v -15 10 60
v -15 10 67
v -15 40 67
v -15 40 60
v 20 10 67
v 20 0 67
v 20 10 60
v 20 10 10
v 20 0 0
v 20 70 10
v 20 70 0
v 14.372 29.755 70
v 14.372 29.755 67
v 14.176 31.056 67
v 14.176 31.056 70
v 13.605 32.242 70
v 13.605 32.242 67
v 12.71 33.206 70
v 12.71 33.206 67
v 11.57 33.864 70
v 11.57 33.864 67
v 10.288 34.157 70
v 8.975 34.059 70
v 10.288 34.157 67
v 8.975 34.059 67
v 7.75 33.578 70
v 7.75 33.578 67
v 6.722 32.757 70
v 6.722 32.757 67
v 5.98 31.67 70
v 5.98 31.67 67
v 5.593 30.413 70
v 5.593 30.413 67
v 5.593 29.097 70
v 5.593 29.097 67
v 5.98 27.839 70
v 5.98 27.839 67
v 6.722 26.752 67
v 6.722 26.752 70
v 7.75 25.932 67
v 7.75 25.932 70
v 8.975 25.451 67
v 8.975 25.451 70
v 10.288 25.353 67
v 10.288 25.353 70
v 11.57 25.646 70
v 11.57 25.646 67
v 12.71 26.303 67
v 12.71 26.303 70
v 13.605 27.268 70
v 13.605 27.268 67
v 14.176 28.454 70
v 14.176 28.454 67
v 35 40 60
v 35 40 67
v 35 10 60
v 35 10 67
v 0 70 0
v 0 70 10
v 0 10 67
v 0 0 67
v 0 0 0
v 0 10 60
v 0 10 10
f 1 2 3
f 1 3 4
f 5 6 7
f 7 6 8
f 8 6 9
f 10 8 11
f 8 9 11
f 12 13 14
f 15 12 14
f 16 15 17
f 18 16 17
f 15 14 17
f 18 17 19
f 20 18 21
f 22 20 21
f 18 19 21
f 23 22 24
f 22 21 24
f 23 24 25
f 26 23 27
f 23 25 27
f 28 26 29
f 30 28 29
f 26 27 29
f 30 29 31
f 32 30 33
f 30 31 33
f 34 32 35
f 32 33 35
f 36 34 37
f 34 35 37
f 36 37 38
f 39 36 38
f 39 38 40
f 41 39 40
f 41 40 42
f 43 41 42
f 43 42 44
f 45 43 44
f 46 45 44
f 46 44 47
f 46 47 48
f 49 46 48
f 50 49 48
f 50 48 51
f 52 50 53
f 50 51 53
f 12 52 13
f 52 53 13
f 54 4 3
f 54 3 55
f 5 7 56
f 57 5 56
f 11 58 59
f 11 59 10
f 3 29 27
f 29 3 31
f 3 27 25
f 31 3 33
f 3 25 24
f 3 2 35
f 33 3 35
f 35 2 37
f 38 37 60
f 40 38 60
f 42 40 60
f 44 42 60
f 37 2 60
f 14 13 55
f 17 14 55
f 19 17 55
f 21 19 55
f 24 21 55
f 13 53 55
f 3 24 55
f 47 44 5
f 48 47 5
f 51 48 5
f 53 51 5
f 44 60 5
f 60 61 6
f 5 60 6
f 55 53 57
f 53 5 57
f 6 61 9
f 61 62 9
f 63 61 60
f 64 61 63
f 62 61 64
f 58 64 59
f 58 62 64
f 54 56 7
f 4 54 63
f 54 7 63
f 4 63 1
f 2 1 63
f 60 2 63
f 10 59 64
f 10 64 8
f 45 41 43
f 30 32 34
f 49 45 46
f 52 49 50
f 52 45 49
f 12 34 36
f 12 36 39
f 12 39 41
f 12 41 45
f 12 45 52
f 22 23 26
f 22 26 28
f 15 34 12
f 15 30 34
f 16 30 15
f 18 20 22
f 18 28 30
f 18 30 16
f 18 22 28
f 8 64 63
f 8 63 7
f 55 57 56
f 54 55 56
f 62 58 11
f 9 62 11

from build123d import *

# Parameters (mm, degrees)
SKETCH1_W           = 20
SKETCH1_H           = 70
BOSS_EXTRUDE1_DEPTH = 10
SKETCH2_W           = 20
SKETCH2_H           = 10
BOSS_EXTRUDE2_DEPTH = 50
SKETCH3_W           = 20
SKETCH3_H           = 10
BOSS_EXTRUDE3_DEPTH = 7
SKETCH4_W           = 15
SKETCH4_H           = 7
SKETCH4_W_2         = 20
BOSS_EXTRUDE4_DEPTH = 30
SKETCH5_R           = 4.414464055
BOSS_EXTRUDE5_DEPTH = 3


with BuildPart() as part:
    # Sketch1 → Boss-Extrude1 (new body)
    with BuildSketch(Plane.XY):
        with Locations((10, 35)):
            Rectangle(SKETCH1_W, SKETCH1_H)
    extrude(amount=BOSS_EXTRUDE1_DEPTH)

    # Sketch2 → Boss-Extrude2 (add)
    with BuildSketch(Plane.XY.offset(10)):
        with Locations((10, 5)):
            Rectangle(SKETCH2_W, SKETCH2_H)
    extrude(amount=BOSS_EXTRUDE2_DEPTH)

    # Sketch3 → Boss-Extrude3 (add)
    with BuildSketch(Plane.XY.offset(60)):
        with Locations((10, 5)):
            Rectangle(SKETCH3_W, SKETCH3_H)
    extrude(amount=BOSS_EXTRUDE3_DEPTH)

    # Sketch4 → Boss-Extrude4 (add)
    with BuildSketch(Plane(origin=(0, 10, 0), x_dir=(1, 0, 0), z_dir=(0, 1, 0))):
        with Locations((-7.5, -63.5)):
            Rectangle(SKETCH4_W, SKETCH4_H)
        with Locations((10, -63.5)):
            Rectangle(SKETCH4_W_2, SKETCH4_H)
        with Locations((27.5, -63.5)):
            Rectangle(SKETCH4_W, SKETCH4_H)
    extrude(amount=BOSS_EXTRUDE4_DEPTH)

    # Sketch5 → Boss-Extrude5 (add)
    with BuildSketch(Plane.XY.offset(67)):
        with Locations((9.957681606, 29.754854133)):
            Circle(SKETCH5_R)
    extrude(amount=BOSS_EXTRUDE5_DEPTH)


solid = part.part
